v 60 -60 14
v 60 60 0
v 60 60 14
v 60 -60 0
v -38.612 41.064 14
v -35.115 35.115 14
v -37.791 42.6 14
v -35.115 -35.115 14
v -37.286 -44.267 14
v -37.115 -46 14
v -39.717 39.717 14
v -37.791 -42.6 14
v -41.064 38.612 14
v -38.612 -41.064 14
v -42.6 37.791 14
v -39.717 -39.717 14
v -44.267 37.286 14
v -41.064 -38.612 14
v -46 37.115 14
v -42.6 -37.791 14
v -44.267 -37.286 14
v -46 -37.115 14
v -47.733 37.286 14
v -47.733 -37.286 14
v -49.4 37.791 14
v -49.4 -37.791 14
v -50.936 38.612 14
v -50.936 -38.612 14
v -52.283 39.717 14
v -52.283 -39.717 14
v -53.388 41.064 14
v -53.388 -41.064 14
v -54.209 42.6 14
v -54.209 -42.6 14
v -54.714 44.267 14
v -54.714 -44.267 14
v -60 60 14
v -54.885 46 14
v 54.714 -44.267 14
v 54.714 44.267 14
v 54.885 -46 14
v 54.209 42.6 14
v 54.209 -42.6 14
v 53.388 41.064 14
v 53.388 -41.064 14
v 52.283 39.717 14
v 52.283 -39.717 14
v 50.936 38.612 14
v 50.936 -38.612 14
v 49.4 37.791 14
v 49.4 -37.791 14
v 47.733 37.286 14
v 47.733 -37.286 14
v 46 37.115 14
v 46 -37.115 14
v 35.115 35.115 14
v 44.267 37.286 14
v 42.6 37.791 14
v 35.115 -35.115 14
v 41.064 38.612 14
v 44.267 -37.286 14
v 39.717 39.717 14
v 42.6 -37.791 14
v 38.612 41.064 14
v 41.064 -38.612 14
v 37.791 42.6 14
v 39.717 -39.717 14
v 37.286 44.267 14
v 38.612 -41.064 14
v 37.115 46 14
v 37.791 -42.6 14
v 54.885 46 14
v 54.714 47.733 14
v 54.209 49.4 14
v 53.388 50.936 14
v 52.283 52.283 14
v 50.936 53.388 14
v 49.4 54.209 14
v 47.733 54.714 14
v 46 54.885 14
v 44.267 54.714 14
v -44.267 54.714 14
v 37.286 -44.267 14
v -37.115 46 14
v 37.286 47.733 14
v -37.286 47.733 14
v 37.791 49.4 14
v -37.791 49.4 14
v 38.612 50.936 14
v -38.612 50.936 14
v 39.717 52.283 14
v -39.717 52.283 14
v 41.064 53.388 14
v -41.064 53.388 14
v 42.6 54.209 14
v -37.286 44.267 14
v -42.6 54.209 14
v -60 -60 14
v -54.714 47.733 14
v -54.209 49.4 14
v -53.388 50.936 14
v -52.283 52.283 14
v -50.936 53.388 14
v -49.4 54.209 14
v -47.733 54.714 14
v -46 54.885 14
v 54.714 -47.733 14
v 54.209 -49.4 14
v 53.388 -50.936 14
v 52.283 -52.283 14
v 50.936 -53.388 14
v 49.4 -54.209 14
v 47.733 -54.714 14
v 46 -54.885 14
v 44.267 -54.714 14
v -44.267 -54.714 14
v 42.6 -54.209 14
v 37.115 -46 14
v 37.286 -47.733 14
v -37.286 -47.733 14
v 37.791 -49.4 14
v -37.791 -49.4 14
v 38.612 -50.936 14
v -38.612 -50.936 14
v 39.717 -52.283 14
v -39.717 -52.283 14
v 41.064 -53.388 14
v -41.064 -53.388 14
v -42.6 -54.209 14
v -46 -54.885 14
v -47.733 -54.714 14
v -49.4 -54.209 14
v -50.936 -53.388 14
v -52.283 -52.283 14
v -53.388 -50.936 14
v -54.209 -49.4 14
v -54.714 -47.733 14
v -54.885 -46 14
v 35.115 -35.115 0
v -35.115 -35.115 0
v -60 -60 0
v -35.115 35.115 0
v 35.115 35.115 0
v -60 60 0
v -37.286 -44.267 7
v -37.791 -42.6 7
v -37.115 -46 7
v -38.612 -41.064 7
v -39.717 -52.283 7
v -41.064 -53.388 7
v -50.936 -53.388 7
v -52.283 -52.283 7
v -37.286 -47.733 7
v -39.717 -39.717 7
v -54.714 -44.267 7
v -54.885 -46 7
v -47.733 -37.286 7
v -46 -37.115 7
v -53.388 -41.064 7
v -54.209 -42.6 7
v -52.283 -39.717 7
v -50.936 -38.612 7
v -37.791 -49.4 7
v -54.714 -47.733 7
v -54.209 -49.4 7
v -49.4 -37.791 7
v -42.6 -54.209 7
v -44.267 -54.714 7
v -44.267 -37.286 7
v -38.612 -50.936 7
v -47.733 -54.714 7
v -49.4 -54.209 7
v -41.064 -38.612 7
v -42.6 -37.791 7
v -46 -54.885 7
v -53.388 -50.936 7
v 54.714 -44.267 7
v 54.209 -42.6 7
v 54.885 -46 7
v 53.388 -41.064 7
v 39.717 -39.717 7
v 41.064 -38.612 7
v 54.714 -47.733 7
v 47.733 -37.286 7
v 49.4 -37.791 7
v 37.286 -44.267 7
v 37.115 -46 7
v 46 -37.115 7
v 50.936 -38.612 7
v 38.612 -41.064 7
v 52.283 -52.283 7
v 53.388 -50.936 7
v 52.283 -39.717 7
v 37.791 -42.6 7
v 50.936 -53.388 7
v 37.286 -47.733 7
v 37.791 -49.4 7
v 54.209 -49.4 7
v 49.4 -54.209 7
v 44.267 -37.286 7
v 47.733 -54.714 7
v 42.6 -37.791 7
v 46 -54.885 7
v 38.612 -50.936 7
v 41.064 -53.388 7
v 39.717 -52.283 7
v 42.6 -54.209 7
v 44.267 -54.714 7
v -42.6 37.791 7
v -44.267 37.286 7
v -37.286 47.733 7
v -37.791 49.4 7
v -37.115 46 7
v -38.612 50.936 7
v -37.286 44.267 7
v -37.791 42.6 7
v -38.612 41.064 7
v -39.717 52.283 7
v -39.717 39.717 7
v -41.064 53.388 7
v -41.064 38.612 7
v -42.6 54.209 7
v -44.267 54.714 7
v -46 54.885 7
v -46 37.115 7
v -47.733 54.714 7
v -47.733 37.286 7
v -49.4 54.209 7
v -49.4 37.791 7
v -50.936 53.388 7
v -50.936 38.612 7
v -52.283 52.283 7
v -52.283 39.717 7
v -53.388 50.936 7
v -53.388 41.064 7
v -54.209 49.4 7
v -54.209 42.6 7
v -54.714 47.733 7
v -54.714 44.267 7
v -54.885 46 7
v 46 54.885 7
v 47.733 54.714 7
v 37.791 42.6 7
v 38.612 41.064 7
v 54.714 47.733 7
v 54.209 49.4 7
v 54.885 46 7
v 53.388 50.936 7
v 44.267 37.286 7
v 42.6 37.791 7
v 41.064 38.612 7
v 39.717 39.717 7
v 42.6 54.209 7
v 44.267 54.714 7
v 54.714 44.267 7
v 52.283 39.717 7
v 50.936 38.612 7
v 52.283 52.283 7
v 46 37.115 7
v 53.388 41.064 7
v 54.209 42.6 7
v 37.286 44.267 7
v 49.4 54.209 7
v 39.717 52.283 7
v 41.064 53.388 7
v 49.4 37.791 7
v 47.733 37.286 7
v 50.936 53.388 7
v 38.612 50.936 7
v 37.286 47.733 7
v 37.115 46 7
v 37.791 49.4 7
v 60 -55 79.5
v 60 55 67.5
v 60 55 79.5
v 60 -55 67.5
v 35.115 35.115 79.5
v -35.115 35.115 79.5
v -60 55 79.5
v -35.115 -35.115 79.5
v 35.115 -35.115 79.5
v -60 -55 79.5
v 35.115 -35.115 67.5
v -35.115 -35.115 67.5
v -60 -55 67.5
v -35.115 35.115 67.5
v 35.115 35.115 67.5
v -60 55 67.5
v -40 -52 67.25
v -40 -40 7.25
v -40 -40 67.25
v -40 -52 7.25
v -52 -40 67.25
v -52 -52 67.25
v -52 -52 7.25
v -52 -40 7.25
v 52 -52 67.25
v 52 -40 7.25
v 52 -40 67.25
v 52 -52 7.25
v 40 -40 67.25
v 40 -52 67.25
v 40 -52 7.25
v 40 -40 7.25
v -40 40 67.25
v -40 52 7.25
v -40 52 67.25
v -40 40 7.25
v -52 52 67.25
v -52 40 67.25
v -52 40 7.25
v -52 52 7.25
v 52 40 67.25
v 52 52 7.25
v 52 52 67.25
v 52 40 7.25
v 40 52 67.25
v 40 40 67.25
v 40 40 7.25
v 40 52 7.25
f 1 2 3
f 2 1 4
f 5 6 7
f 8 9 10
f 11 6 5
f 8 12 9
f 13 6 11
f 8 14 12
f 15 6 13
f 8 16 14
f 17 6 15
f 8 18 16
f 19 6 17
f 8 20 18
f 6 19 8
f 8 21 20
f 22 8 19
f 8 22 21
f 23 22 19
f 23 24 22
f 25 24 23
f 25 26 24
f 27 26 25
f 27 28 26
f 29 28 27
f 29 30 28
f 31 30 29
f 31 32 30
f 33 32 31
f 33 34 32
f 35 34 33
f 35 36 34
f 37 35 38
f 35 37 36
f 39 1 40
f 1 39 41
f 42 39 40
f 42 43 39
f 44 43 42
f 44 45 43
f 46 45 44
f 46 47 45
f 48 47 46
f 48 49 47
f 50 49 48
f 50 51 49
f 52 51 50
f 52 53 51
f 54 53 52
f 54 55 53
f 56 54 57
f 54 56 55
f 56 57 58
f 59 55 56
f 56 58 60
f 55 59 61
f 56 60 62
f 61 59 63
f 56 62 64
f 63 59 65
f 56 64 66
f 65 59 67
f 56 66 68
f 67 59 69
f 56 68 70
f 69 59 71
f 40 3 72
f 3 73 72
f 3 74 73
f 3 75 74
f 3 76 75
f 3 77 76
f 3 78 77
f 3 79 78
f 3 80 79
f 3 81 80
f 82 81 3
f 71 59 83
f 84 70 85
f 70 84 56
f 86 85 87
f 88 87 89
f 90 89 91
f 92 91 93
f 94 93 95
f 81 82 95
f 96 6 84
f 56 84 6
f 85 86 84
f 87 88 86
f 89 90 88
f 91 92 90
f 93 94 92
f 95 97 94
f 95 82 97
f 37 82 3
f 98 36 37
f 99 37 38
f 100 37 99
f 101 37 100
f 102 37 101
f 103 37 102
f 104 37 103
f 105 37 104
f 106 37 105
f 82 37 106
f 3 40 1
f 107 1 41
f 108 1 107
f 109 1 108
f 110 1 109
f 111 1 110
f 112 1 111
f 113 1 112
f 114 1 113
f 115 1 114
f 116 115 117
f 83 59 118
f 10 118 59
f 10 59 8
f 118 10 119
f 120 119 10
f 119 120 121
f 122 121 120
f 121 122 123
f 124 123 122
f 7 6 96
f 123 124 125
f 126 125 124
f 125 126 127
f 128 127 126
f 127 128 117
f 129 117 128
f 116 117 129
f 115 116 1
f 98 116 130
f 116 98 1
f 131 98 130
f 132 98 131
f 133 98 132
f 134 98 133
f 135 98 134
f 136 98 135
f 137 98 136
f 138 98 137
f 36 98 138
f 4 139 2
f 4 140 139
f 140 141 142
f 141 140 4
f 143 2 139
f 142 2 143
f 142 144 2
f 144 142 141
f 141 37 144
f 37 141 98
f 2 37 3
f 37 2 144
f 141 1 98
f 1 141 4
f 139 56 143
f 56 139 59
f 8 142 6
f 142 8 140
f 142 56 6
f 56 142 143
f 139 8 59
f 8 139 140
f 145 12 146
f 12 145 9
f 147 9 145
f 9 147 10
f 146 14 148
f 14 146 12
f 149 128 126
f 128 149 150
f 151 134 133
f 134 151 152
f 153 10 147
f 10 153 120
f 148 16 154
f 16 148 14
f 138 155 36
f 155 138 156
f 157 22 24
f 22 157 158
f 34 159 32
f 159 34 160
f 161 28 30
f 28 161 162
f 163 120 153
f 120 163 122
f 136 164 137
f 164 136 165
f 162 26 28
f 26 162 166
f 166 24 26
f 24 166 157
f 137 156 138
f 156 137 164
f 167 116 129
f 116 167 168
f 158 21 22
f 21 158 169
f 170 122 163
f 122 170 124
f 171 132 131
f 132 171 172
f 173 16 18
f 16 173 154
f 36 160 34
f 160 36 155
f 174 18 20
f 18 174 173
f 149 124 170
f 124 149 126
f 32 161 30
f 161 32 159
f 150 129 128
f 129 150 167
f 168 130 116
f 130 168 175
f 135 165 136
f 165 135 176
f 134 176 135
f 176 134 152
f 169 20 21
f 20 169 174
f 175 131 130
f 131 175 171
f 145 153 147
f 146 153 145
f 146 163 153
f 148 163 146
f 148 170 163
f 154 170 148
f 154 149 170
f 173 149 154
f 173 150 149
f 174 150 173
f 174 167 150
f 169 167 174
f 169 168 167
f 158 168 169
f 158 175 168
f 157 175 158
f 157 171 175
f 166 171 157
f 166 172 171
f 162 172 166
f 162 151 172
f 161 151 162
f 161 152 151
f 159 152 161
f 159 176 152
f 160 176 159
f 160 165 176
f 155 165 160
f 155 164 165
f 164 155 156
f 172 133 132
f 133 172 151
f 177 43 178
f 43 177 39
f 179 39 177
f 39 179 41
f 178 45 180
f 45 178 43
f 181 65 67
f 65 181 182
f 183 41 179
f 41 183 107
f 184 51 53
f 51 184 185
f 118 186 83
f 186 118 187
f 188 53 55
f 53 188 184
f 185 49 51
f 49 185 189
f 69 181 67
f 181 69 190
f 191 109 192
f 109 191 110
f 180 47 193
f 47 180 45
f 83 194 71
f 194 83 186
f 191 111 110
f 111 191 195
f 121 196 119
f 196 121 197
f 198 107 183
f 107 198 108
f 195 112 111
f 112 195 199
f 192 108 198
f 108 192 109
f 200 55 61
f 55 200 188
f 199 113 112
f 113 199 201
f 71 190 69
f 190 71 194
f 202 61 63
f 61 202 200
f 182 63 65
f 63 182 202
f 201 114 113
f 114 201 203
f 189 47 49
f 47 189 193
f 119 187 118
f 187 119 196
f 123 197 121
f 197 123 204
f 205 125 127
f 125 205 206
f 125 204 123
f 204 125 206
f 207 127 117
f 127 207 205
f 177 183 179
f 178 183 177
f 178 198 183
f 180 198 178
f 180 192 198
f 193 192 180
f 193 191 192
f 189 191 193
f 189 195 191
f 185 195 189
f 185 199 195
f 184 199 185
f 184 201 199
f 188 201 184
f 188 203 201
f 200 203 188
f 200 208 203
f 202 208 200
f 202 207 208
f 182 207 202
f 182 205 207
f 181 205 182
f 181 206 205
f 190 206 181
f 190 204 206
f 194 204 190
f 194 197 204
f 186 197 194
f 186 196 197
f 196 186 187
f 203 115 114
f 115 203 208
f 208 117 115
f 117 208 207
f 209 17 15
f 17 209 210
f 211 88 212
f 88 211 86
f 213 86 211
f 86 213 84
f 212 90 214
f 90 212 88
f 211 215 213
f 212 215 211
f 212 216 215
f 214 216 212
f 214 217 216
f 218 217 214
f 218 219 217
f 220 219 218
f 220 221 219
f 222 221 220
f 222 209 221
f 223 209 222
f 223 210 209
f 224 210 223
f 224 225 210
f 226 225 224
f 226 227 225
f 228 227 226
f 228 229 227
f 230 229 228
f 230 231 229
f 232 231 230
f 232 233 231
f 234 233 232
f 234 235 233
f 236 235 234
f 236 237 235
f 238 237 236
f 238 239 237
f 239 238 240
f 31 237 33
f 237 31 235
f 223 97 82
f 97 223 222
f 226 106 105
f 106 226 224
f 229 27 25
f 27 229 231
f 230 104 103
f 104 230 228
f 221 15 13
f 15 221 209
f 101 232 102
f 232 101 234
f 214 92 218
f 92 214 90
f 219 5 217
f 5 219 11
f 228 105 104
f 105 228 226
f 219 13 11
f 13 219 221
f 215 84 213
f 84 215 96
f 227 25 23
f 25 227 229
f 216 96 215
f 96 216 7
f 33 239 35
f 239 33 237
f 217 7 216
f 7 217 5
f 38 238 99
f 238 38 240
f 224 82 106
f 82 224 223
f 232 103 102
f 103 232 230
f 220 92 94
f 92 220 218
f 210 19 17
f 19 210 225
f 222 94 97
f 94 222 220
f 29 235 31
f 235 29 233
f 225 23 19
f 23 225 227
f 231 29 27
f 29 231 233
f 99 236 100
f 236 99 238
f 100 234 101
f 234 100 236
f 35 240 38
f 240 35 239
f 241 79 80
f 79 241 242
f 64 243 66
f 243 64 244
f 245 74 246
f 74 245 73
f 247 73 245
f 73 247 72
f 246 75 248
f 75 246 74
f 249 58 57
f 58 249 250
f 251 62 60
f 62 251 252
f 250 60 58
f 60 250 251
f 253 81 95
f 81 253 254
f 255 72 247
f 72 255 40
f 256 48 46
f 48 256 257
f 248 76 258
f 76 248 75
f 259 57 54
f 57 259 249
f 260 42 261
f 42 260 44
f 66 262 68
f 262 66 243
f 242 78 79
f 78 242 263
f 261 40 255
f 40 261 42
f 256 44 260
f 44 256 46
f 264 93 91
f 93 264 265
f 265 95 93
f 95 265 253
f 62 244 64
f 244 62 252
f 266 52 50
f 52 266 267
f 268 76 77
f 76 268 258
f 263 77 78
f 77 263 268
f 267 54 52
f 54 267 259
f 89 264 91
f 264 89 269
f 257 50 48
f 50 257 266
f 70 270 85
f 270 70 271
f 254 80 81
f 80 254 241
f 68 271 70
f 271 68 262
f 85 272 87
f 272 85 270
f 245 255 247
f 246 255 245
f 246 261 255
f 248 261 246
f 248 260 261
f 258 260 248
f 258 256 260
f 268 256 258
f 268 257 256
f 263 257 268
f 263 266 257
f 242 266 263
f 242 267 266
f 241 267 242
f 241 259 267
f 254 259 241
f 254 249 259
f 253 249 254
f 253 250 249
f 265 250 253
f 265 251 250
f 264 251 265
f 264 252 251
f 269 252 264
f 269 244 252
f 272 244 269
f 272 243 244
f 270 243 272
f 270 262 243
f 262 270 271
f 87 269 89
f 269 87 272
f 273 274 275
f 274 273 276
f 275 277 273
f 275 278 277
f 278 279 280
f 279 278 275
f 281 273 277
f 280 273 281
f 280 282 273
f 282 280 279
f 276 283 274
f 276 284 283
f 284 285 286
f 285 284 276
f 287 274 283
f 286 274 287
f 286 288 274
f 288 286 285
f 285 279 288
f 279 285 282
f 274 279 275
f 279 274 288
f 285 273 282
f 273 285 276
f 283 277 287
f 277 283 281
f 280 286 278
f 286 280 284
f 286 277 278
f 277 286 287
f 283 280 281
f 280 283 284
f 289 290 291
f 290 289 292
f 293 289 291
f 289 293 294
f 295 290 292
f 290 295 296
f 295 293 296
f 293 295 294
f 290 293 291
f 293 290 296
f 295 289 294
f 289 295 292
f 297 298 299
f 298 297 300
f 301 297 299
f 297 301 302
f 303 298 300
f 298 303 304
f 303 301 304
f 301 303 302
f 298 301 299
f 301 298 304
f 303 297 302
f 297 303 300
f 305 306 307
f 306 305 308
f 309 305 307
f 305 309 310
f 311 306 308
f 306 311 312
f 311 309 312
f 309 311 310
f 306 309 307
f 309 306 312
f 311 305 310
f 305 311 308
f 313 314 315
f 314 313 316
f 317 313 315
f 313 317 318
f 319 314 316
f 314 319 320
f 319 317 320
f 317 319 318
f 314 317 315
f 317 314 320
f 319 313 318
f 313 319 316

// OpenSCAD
$fn = 32;

// ------------------------------------------------------------------------
// Frame cube: base 120 x 120 mm, posts 60 mm tall
// Every part is its own module, assembly() places every instance.
// ------------------------------------------------------------------------

// --- part 1 ---
module base_frame() {
  difference() {
    translate([-60, -60, 0]) cube([120, 120, 14]);
    translate([-35.115, -35.115, -1]) cube([70.23, 70.23, 16]);
    translate([-46, -46, 7]) cylinder(h = 8, d = 17.77);
    translate([46, -46, 7]) cylinder(h = 8, d = 17.77);
    translate([-46, 46, 7]) cylinder(h = 8, d = 17.77);
    translate([46, 46, 7]) cylinder(h = 8, d = 17.77);
  }
}

// --- part 2 ---
module corner_post() {
  translate([-6, -6, 0]) cube([12, 12, 60]);
}

// --- part 3 ---
module top_frame() {
  difference() {
    translate([-60, -55, 0]) cube([120, 110, 12]);
    translate([-35.115, -35.115, -1]) cube([70.23, 70.23, 14]);
  }
}

// --- assembly ---
module assembly() {
  color([0.80, 0.24, 0.20]) translate([0, 0, 0]) rotate([0, 0, 0]) base_frame();
  color([0.20, 0.45, 0.75]) translate([-46, -46, 7.25]) rotate([0, 0, 0]) corner_post();
  color([0.25, 0.62, 0.32]) translate([46, -46, 7.25]) rotate([0, 0, 0]) corner_post();
  color([0.92, 0.70, 0.18]) translate([-46, 46, 7.25]) rotate([0, 0, 0]) corner_post();
  color([0.58, 0.35, 0.70]) translate([46, 46, 7.25]) rotate([0, 0, 0]) corner_post();
  color([0.16, 0.66, 0.66]) translate([0, 0, 67.5]) rotate([0, 0, 0]) top_frame();
}

assembly();
